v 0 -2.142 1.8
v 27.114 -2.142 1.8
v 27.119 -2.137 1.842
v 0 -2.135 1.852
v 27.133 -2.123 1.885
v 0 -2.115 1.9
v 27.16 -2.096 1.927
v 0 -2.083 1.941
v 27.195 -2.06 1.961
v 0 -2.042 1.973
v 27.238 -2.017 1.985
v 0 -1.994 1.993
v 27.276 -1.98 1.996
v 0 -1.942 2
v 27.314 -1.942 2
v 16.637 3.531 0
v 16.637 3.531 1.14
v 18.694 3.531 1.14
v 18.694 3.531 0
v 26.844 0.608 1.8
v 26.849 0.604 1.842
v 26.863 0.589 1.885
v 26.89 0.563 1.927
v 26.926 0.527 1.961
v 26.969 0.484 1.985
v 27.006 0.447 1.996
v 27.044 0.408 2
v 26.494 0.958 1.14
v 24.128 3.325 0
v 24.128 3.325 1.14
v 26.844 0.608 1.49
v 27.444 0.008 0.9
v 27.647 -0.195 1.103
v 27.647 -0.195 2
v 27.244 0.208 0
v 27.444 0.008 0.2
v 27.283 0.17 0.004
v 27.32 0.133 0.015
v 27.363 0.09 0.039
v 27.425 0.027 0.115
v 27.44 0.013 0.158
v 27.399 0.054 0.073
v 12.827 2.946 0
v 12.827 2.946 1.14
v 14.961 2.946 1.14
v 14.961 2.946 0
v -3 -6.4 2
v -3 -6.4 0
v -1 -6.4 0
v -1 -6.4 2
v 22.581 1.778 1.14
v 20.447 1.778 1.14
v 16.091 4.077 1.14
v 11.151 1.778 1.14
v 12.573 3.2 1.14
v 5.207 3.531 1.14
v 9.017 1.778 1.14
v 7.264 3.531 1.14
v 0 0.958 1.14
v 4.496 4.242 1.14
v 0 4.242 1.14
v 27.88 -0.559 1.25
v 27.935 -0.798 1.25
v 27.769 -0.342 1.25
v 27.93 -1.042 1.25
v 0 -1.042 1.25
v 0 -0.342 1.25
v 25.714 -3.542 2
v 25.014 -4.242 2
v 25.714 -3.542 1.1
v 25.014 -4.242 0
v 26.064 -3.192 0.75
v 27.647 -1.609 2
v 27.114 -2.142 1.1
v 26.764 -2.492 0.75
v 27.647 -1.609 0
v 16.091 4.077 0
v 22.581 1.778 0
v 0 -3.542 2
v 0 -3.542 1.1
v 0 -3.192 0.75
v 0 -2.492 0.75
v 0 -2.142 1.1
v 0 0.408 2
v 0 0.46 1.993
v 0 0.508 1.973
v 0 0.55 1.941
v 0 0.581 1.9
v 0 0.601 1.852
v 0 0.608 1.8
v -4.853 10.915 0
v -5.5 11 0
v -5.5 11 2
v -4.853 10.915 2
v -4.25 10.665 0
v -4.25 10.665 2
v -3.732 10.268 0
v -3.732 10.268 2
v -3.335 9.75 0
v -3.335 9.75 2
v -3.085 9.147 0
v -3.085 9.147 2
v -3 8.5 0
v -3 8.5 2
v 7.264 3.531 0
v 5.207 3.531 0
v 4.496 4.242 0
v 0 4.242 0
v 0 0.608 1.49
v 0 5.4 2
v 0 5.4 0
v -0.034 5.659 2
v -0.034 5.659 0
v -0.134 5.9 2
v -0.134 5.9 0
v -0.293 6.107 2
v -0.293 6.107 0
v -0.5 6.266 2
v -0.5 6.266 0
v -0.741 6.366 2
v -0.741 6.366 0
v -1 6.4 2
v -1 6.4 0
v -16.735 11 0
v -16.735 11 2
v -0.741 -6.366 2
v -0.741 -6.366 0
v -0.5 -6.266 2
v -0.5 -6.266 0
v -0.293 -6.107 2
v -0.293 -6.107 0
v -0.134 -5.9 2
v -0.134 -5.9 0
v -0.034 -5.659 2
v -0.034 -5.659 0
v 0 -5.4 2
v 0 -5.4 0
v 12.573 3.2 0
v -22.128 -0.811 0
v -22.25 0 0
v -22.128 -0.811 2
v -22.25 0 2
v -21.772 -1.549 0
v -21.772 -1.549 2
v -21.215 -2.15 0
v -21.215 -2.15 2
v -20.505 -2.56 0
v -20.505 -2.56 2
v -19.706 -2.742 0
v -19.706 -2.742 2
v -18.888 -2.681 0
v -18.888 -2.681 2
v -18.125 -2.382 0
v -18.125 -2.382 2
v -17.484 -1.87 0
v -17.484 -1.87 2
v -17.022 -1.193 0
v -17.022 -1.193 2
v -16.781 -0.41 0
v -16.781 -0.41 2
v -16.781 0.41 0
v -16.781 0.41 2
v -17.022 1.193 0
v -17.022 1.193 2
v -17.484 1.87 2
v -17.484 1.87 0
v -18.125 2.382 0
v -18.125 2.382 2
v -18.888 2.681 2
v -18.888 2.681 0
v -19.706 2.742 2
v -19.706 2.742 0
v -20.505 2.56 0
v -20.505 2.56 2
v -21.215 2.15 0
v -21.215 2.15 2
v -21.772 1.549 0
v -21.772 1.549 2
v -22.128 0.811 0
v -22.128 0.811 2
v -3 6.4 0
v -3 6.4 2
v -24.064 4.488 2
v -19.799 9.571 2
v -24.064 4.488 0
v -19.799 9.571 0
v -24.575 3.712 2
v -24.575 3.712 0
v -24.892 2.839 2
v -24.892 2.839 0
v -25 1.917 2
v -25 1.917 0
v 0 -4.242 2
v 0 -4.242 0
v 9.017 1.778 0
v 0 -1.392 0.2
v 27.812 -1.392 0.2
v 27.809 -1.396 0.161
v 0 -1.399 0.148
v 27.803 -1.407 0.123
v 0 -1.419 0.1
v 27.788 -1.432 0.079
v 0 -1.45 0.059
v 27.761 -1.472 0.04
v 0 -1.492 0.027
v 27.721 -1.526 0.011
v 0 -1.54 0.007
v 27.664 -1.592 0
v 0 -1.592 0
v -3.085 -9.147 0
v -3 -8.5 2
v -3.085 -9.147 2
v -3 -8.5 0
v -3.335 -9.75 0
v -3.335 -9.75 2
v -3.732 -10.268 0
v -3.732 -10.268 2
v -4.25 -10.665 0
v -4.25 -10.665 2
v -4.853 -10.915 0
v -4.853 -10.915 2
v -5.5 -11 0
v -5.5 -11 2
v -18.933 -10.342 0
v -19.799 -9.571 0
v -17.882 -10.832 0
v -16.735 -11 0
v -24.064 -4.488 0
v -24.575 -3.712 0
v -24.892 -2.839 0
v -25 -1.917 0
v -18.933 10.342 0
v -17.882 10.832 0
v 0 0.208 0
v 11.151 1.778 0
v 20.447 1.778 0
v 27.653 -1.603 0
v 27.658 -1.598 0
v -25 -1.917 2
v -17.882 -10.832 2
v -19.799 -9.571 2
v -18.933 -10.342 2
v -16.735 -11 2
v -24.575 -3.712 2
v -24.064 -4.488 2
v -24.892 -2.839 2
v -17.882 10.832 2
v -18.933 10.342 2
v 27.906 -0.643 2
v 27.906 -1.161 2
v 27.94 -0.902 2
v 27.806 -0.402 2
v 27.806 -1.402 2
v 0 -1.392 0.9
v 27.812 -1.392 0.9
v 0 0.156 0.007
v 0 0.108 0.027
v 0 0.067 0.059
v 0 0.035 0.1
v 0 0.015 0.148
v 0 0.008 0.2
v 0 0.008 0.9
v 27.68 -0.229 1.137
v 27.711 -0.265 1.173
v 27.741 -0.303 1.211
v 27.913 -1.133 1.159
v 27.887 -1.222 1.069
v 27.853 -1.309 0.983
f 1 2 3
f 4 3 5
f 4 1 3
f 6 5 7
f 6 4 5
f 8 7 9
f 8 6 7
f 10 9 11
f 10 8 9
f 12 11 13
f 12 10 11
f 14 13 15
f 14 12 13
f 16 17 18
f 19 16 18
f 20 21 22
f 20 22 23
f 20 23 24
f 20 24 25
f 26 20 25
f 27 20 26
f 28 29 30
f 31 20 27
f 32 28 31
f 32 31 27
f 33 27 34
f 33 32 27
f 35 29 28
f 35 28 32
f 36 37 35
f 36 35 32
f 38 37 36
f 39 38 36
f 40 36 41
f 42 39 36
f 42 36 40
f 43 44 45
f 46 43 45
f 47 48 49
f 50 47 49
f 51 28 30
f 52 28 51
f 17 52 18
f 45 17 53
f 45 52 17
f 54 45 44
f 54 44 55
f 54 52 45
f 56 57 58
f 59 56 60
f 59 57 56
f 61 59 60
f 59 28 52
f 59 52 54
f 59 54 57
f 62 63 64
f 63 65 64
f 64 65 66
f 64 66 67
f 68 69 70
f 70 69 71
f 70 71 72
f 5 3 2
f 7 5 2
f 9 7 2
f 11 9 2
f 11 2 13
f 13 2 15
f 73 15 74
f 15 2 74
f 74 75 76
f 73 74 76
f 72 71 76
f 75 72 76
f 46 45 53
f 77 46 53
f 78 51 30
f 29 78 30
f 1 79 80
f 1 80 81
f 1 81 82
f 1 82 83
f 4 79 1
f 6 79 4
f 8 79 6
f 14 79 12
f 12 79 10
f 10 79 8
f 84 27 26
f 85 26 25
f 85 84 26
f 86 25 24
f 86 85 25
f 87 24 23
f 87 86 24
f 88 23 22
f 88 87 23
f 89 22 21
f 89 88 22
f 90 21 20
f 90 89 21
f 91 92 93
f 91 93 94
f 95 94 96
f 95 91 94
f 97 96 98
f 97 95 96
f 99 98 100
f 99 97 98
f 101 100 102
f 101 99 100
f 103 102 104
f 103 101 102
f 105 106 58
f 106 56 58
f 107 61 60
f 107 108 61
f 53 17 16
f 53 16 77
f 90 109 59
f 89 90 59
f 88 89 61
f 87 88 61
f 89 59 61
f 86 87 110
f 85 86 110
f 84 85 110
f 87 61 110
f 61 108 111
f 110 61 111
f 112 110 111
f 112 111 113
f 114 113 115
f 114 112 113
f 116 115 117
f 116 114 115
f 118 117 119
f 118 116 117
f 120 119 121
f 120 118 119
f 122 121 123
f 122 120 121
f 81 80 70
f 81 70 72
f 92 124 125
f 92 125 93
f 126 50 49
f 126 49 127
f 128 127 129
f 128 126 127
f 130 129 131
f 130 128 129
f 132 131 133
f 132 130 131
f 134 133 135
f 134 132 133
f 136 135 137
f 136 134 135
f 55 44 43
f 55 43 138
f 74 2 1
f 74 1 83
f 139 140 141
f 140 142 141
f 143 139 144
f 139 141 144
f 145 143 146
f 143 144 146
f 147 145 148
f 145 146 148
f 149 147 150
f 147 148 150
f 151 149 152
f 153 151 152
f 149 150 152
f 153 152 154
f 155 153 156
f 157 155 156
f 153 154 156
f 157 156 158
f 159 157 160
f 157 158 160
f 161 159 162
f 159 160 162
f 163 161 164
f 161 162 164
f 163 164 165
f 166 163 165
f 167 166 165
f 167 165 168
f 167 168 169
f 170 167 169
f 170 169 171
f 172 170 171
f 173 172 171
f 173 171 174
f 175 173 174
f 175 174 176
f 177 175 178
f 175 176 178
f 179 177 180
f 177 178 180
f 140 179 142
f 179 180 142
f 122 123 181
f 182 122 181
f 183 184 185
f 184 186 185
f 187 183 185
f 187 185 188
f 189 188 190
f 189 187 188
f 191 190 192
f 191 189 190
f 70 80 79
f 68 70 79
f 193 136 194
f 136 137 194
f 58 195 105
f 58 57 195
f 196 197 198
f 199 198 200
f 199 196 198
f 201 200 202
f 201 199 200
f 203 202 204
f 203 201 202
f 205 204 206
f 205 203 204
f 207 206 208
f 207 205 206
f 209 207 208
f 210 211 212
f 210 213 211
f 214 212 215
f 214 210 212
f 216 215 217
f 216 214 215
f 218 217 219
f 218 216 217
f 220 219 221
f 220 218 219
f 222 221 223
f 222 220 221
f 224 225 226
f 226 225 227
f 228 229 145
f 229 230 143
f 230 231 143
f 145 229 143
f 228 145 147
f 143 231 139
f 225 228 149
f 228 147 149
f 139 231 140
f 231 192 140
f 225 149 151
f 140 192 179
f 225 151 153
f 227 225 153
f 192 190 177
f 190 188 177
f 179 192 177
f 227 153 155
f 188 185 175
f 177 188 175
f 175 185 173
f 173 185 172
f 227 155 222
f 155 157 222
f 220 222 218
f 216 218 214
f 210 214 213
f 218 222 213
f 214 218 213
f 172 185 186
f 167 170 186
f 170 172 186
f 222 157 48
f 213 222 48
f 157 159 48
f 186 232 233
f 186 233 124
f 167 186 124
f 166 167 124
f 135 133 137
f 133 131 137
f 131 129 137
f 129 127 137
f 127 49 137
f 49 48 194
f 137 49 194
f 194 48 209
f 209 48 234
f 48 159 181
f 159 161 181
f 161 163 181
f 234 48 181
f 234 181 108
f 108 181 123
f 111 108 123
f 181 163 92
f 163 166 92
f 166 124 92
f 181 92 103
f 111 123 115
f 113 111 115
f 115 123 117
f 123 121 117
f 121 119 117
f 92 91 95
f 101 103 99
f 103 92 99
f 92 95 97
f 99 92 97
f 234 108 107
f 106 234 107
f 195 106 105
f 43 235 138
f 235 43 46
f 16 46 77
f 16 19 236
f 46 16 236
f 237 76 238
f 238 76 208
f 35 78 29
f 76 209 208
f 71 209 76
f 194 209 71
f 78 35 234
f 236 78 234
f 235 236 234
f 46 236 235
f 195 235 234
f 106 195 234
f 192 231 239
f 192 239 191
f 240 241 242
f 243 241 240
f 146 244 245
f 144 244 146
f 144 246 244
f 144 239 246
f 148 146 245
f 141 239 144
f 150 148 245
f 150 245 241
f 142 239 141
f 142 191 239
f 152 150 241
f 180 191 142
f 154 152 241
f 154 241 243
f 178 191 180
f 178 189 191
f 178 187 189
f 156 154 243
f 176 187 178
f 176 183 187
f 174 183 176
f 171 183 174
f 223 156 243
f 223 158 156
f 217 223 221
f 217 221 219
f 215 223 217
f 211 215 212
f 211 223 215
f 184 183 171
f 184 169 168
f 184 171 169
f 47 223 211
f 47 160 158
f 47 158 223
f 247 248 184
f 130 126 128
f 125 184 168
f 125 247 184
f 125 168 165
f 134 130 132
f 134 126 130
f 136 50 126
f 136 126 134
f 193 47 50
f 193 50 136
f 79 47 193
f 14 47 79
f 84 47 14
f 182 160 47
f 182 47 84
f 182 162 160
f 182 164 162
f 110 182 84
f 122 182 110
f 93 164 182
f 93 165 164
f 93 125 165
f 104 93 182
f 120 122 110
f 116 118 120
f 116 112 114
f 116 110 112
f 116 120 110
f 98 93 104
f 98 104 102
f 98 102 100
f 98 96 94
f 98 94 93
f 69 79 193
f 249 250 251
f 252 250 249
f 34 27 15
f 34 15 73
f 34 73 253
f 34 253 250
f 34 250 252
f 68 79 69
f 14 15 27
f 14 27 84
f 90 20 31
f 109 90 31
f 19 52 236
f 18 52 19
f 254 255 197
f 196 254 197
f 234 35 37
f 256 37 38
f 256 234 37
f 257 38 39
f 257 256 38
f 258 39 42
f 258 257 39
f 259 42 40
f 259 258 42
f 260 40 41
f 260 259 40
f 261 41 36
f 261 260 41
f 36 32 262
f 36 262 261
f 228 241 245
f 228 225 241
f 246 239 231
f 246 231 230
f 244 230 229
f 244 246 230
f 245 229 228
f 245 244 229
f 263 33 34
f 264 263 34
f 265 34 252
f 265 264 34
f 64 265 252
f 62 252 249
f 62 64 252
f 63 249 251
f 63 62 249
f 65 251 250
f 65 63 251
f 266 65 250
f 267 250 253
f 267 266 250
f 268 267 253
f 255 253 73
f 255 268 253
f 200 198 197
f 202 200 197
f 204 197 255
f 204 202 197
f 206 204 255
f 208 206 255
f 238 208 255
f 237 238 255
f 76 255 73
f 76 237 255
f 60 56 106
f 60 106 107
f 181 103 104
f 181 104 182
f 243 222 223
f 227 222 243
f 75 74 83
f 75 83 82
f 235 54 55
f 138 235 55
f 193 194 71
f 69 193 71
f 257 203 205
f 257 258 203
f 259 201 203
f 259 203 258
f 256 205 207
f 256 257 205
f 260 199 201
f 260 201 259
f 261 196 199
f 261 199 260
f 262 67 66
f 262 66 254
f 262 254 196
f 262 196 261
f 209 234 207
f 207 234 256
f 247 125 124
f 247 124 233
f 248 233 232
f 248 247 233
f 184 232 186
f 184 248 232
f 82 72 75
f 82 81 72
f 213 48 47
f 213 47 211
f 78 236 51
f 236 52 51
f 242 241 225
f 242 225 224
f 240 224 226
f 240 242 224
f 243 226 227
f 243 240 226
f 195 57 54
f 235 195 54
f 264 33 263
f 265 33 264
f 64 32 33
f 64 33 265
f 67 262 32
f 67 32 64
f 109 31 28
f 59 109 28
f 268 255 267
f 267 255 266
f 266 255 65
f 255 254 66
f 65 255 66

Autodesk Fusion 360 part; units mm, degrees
sketch "Sketch1" plane through (0, 0, 0) normal (0, 0, 1) x (1, 0, 0)
  line L0 (0, 0) -> (27.94, 0) construction
  line L1 (0, -4.2418) -> (27.94, -4.2418)
  line L2 (0, 4.2418) -> (27.94, 4.2418)
  line L3 (-3, -6.4) -> (0, -6.4)
  line L4 (0, 6.4) -> (-3, 6.4)
  line L5 (-18.6, 11) -> (-3, 11)
  line L6 (-3, -11) -> (-18.6, -11)
  line L7 (-25, -3.3728) -> (-25, 3.3728)
  line L8 (-18.6, 11) -> (-25, 3.3728)
  line L9 (-25, 11) -> (-33.2141, 11) construction
  line L10 (-18.6, -11) -> (-25, -3.3728)
  line L11 (-18.6, -11) -> (-34.3032, -11) construction
  line L12 (-3, 11) -> (-3, 6.4)
  line L13 (-3, -6.4) -> (-3, -11)
  arc A0 (-3, 8.5) -> (-5.5, 11) centre (-5.5, 8.5) ccw
  arc A1 (-5.5, -11) -> (-3, -8.5) centre (-5.5, -8.5) ccw
  line L14 (27.94, 4.2418) -> (27.94, -4.2418)
  line L15 (23.2107, 4.2418) -> (27.6471, -0.1946)
  line L16 (23.2107, 4.2418) -> (33.0981, 4.2418) construction
  line L17 (0, -0.9017) -> (27.94, -0.9017) construction
  line L18 (25.0141, -4.2418) -> (27.6471, -1.6088)
  line L19 (25.0141, -4.2418) -> (38.1109, -4.2418) construction
  arc A2 (27.6471, -1.6088) -> (27.3724, 0) centre (26.94, -0.9017) ccw
  line L20 (0, 4.2418) -> (0, 6.4)
  line L21 (0, -6.4) -> (0, -4.2418)
  dimension "d6" = 27.94
  dimension "d7" = 4.2418
  dimension "d8" = -4.2418
  dimension "d10" = 6.4
  dimension "d11" = 6.4
  dimension "d13" = 3
  dimension "d14" = 11
  dimension "d15" = 11
  dimension "d17" = 50
  dimension "d19" = 50
  dimension "d21" = 6.4
  dimension "d23" = 5
  dimension "d24" = 5
  dimension "d25" = 22
  dimension "d26" = 7.6272
  dimension "d27" = 7.6272
  dimension "d29" = 45
  dimension "d30" = 3.3401
  dimension "d31" = 2
  dimension "d32" = 45
extrude "Extrude1" add sketch "Sketch1" along normal blind 2 contours L1 L2 L3 L4 L5 L6 L7 L8 L10 L12 L13 A0 A1 L15 L18 A2 L20 L21
fillet "Fillet1" radius 1 2 edges at (0, -6.4, 1) (0, 6.4, 1)
fillet "Fillet1" radius 4 4 edges at (-18.6, -11, 1) (-25, -3.3728, 1) (-25, 3.3728, 1) (-18.6, 11, 1)
sketch "Sketch2" plane through (0, 0, 2) normal (0, 0, 1) x (-1, 0, 0)
  line L0 (3, 6.4) -> (1, 6.4)
  line L1 (0, 5.4) -> (0, 4.2418)
  line L2 (0, 4.2418) -> (-25.0141, 4.2418)
  line L3 (-25.0141, 4.2418) -> (-27.6471, 1.6088)
  arc A0 (-27.6471, 1.6088) -> (-27.6471, 0.1946) centre (-26.94, 0.9017) ccw
  line L4 (-27.6471, 0.1946) -> (-23.2107, -4.2418)
  line L5 (-23.2107, -4.2418) -> (0, -4.2418)
  line L6 (0, -4.2418) -> (0, -5.4)
  line L7 (1, -6.4) -> (3, -6.4)
  line L8 (3, -6.4) -> (3, -8.5)
  arc A1 (3, -8.5) -> (5.5, -11) centre (5.5, -8.5) ccw
  line L9 (5.5, -11) -> (16.7348, -11)
  line L10 (19.7989, -9.5712) -> (24.0642, -4.488)
  line L11 (25, -1.9169) -> (25, 1.9169)
  line L12 (24.0642, 4.488) -> (19.7989, 9.5712)
  line L13 (16.7348, 11) -> (5.5, 11)
  arc A2 (5.5, 11) -> (3, 8.5) centre (5.5, 8.5) ccw
  line L14 (3, 8.5) -> (3, 6.4)
  line L15 (0, 4.2418) -> (0, -4.2418) construction
  line L16 (-6.2738, -4.2418) -> (-6.2738, 4.2418) construction
  line L17 (-10.0838, -4.2418) -> (-10.0838, 4.2418) construction
  line L18 (-13.8938, -4.2418) -> (-13.8938, 4.2418) construction
  line L19 (-17.7038, -4.2418) -> (-17.7038, 4.2418) construction
  line L20 (-21.5138, -4.2418) -> (-21.5138, 4.2418) construction
  line L21 (-5.207, -4.2418) -> (-5.207, 4.2418) construction
  line L22 (-7.3406, -4.2418) -> (-7.3406, 4.2418) construction
  line L23 (-9.017, -4.2418) -> (-9.017, 4.2418) construction
  line L24 (-11.1506, -4.2418) -> (-11.1506, 4.2418) construction
  line L25 (-12.827, -4.2418) -> (-12.827, 4.2418) construction
  line L26 (-14.9606, -4.2418) -> (-14.9606, 4.2418) construction
  line L27 (-16.637, -4.2418) -> (-16.637, 4.2418) construction
  line L28 (-18.7706, -4.2418) -> (-18.7706, 4.2418) construction
  line L29 (-20.447, -4.2418) -> (-20.447, 4.2418) construction
  line L30 (-22.5806, -4.2418) -> (-22.5806, 4.2418) construction
  line L31 (-5.207, -3.5306) -> (-7.3406, -3.5306)
  line L32 (-9.017, -1.778) -> (-11.1506, -1.778)
  line L33 (-12.827, -2.9464) -> (-14.9606, -2.9464)
  line L34 (-16.637, -3.5306) -> (-18.7706, -3.5306)
  line L35 (-20.447, -1.778) -> (-22.5806, -1.778)
  line L36 (-5.207, -3.5306) -> (-0.9644, -7.7732)
  line L37 (-5.207, -3.5306) -> (0.793, -3.5306) construction
  line L38 (-7.3406, -3.5306) -> (-11.5832, -7.7732)
  line L39 (-7.3406, -3.5306) -> (-13.3406, -3.5306) construction
  line L40 (-9.017, -1.778) -> (-4.7744, -6.0206)
  line L41 (-9.017, -1.778) -> (-3.017, -1.778) construction
  line L42 (-11.1506, -1.778) -> (-15.3932, -6.0206)
  line L43 (-11.1506, -1.778) -> (-17.1506, -1.778) construction
  line L44 (-12.827, -2.9464) -> (-8.5844, -7.189)
  line L45 (-12.827, -2.9464) -> (-6.827, -2.9464) construction
  line L46 (-14.9606, -2.9464) -> (-19.2032, -7.189)
  line L47 (-14.9606, -2.9464) -> (-20.9606, -2.9464) construction
  line L48 (-16.637, -3.5306) -> (-12.3944, -7.7732)
  line L49 (-16.637, -3.5306) -> (-10.637, -3.5306) construction
  line L50 (-18.7706, -3.5306) -> (-23.0132, -7.7732)
  line L51 (-18.7706, -3.5306) -> (-24.7706, -3.5306) construction
  line L52 (-20.447, -1.778) -> (-16.2044, -6.0206)
  line L53 (-20.447, -1.778) -> (-14.447, -1.778) construction
  line L54 (-22.5806, -1.778) -> (-26.8232, -6.0206)
  line L55 (-22.5806, -1.778) -> (-28.5806, -1.778) construction
  line L56 (0, 0) -> (25, 0) construction
  circle A3 centre (19.5, 0) radius 2.75
  arc A4 (0, -5.4) -> (1, -6.4) centre (1, -5.4) ccw
  arc A5 (1, 6.4) -> (0, 5.4) centre (1, 5.4) ccw
  arc A6 (16.7348, -11) -> (19.7989, -9.5712) centre (16.7348, -7) ccw
  arc A7 (24.0642, -4.488) -> (25, -1.9169) centre (21, -1.9169) ccw
  arc A8 (25, 1.9169) -> (24.0642, 4.488) centre (21, 1.9169) ccw
  arc A9 (19.7989, 9.5712) -> (16.7348, 11) centre (16.7348, 7) ccw
  dimension "d35" = 6.2738
  dimension "d36" = 10.0838
  dimension "d37" = 13.8938
  dimension "d38" = 17.7038
  dimension "d39" = 21.5138
  dimension "d40" = 1.0668
  dimension "d41" = -1.0668
  dimension "d42" = 1.0668
  dimension "d43" = -1.0668
  dimension "d44" = 1.0668
  dimension "d45" = -1.0668
  dimension "d46" = 1.0668
  dimension "d47" = -1.0668
  dimension "d48" = 1.0668
  dimension "d49" = -1.0668
  dimension "d51" = 6.0198
  dimension "d53" = 7.1882
  dimension "d54" = 7.7724
  dimension "d55" = 6.0198
  dimension "d56" = 45
  dimension "d57" = 6
  dimension "d58" = 45
  dimension "d59" = 6
  dimension "d60" = 45
  dimension "d61" = 6
  dimension "d62" = 45
  dimension "d63" = 6
  dimension "d64" = 45
  dimension "d65" = 6
  dimension "d66" = 45
  dimension "d67" = 6
  dimension "d68" = 45
  dimension "d69" = 6
  dimension "d70" = 45
  dimension "d71" = 6
  dimension "d72" = 45
  dimension "d73" = 6
  dimension "d74" = 45
  dimension "d75" = 6
  dimension "d76" = 5.5
  dimension "d77" = 5.5
  dimension "d123" = 7.7724
extrude "Extrude2" cut sketch "Sketch2" against normal blind 2 contours L0 L1 L2 L3 A0 L4 L5 L6 L7 L8 A1 L9 L10 L11 L12 L13 A2 L14 L31 L32 L33 L34 L35 L36 L40 L42 L44 L46 L48 L52 L54 A4 A5 A6 A7 A8 A9 keep common part
sketch "Sketch3" plane through (0, 0, 0) normal (1, 0, 0) x (0, 1, 0)
  line L0 (4.2418, 0) -> (4.2418, 2)
  line L1 (-4.2418, 0) -> (-4.2418, 2)
  line L2 (-4.2418, 2) -> (4.2418, 2)
  line L3 (-4.2418, 0) -> (4.2418, 0)
  line L4 (-3.5418, 0.75) -> (-3.5418, 2)
  line L5 (-2.1418, 2) -> (-2.1418, 0.75)
  line L6 (0.6082, 2) -> (0.6082, 1.49)
  line L7 (-1.3918, 1.25) -> (-1.3918, 0)
  line L8 (0.0082, 1.25) -> (0.0082, 0)
  line L9 (-3.5418, 0.75) -> (-2.1418, 0.75)
  line L10 (-1.3918, 1.25) -> (0.0082, 1.25)
  line L11 (0.9582, 1.14) -> (4.2418, 1.14)
  line L12 (0.6082, 1.49) -> (0.9582, 1.14)
  line L13 (0.6082, 1.49) -> (1.6082, 1.49) construction
  line L14 (-1.3918, 0.9) -> (-1.0418, 1.25)
  line L15 (-1.3918, 0.9) -> (-0.3918, 0.9) construction
  line L16 (0.0082, 0.9) -> (-0.3418, 1.25)
  line L17 (0.0082, 0.9) -> (-0.9918, 0.9) construction
  line L18 (-3.5418, 1.1) -> (-2.5418, 1.1) construction
  line L19 (-2.1418, 1.1) -> (-3.1418, 1.1) construction
  line L20 (-3.5418, 1.1) -> (-3.1918, 0.75)
  line L21 (-2.8418, 0.4) -> (-2.8347, 0.3929) construction
  line L22 (-2.1418, 1.1) -> (-2.4918, 0.75)
  line L23 (-2.8418, 0.4) -> (-2.8489, 0.3929) construction
  arc A0 (-1.9418, 2) -> (-2.1418, 1.8) centre (-1.9418, 1.8) ccw
  arc A1 (0.6082, 1.8) -> (0.4082, 2) centre (0.4082, 1.8) ccw
  arc A2 (0.0082, 0.2) -> (0.2082, 0) centre (0.2082, 0.2) ccw
  arc A3 (-1.5918, 0) -> (-1.3918, 0.2) centre (-1.5918, 0.2) ccw
  point P0 (-4.2418, 0)
  point P1 (-4.2418, 2)
  dimension "d84" = 0.7
  dimension "d85" = 1.4
  dimension "d86" = 2.75
  dimension "d87" = 2.85
  dimension "d88" = 1.4
  dimension "d90" = 0.75
  dimension "d92" = 1.25
  dimension "d93" = 0.86
  dimension "d96" = 45
  dimension "d99" = 45
  dimension "d101" = 45
  dimension "d103" = 0.35
  dimension "d104" = 0.35
  dimension "d105" = 45
  dimension "d106" = 1
  dimension "d107" = 45
  dimension "d108" = 1
  dimension "d109" = 0.35
  dimension "d110" = 0.35
  dimension "d111" = 0.35
  dimension "d112" = 0.4
  dimension "d113" = 0.4
  dimension "d114" = 0.4
  dimension "d115" = 0.4
extrude "Extrude3" cut sketch "Sketch3" along normal blind 30 contours L0 L2 L6 L11 L12 | L3 L8 A2 | L3 L7 L8 L10 L14 L16 | L2 L6 A1 | L3 L7 A3 | L2 L5 A0 | L2 L4 L5 L9 L20 L22
sketch "Sketch4" plane through (0, 0, 0) normal (0, 0, 1) x (1, 0, 0)
  line L0 (6.2738, 0) -> (6.2738, 35)
  line L1 (10.0838, 0) -> (10.0838, 30)
  line L2 (13.8938, 0) -> (13.8938, 25)
  line L3 (17.7038, 0) -> (17.7038, 20)
  line L4 (21.5138, 0) -> (21.5138, 15)
  line L5 (6.2738, 35) -> (16.2738, 35) construction
  line L6 (16.2738, 35) -> (16.2738, 39) construction
  line L7 (16.2738, 39) -> (6.2738, 39) construction
  line L8 (6.2738, 39) -> (6.2738, 35) construction
  line L9 (10.0838, 30) -> (20.0838, 30) construction
  line L10 (20.0838, 30) -> (20.0838, 34) construction
  line L11 (20.0838, 34) -> (10.0838, 34) construction
  line L12 (10.0838, 34) -> (10.0838, 30) construction
  line L13 (13.8938, 25) -> (23.8938, 25) construction
  line L14 (23.8938, 25) -> (23.8938, 29) construction
  line L15 (23.8938, 29) -> (13.8938, 29) construction
  line L16 (13.8938, 29) -> (13.8938, 25) construction
  line L17 (17.7038, 20) -> (27.7038, 20) construction
  line L18 (27.7038, 20) -> (27.7038, 24) construction
  line L19 (27.7038, 24) -> (17.7038, 24) construction
  line L20 (17.7038, 24) -> (17.7038, 20) construction
  line L21 (21.5138, 15) -> (31.5138, 15) construction
  line L22 (31.5138, 15) -> (31.5138, 19) construction
  line L23 (31.5138, 19) -> (21.5138, 19) construction
  line L24 (21.5138, 19) -> (21.5138, 15) construction
  line L25 (40.8004, 0.0886) -> (100.8004, 0.0886) construction
  line L26 (100.8004, 0.0886) -> (100.8004, 75.0886) construction
  line L27 (100.8004, 75.0886) -> (40.8004, 75.0886) construction
  line L28 (40.8004, 75.0886) -> (40.8004, 0.0886) construction
  line L29 (100.8004, 69.0886) -> (40.8004, 69.0886) construction
  line L30 (40.8004, 69.0886) -> (100.8004, 69.0886) construction
  line L31 (100.8004, 69.0886) -> (100.8004, 75.0886) construction
  line L32 (100.8004, 75.0886) -> (40.8004, 75.0886) construction
  line L33 (40.8004, 75.0886) -> (40.8004, 69.0886) construction
  line L34 (100.8004, 63.0886) -> (40.8004, 63.0886) construction
  line L35 (40.8004, 63.0886) -> (100.8004, 63.0886) construction
  line L36 (100.8004, 63.0886) -> (100.8004, 69.0886) construction
  line L37 (100.8004, 69.0886) -> (40.8004, 69.0886) construction
  line L38 (40.8004, 69.0886) -> (40.8004, 63.0886) construction
  line L39 (40.8004, 0.1102) -> (100.8004, 0.1102) construction
  line L40 (100.8004, 0.1102) -> (100.8004, 63.0886) construction
  line L41 (100.8004, 63.0886) -> (40.8004, 63.0886) construction
  line L42 (40.8004, 63.0886) -> (40.8004, 0.1102) construction
  line L43 (113.1762, 75.0886) -> (179.487, 75.0886) construction
  line L44 (179.487, 75.0886) -> (179.487, 0.0886) construction
  line L45 (179.487, 0.0886) -> (113.1762, 0.0886) construction
  line L46 (113.1762, 0.0886) -> (113.1762, 75.0886) construction
  line L47 (113.1762, 69.0886) -> (179.487, 69.0886) construction
  line L48 (113.1762, 63.0886) -> (179.487, 63.0886) construction
  line L49 (113.1762, 69.0886) -> (179.487, 69.0886) construction
  line L50 (179.487, 69.0886) -> (179.487, 75.0886) construction
  line L51 (179.487, 75.0886) -> (113.1762, 75.0886) construction
  line L52 (113.1762, 75.0886) -> (113.1762, 69.0886) construction
  line L53 (113.1762, 63.0886) -> (179.487, 63.0886) construction
  line L54 (179.487, 63.0886) -> (179.487, 69.0886) construction
  line L55 (179.487, 69.0886) -> (113.1762, 69.0886) construction
  line L56 (113.1762, 69.0886) -> (113.1762, 63.0886) construction
  line L57 (113.1762, 38.0886) -> (179.487, 38.0886) construction
  line L58 (113.1762, 38.0886) -> (179.487, 38.0886) construction
  line L59 (179.487, 38.0886) -> (179.487, 63.0886) construction
  line L60 (179.487, 63.0886) -> (113.1762, 63.0886) construction
  line L61 (113.1762, 63.0886) -> (113.1762, 38.0886) construction
  line L62 (179.487, 4.8386) -> (113.1762, 4.8386) construction
  line L63 (179.487, 9.5886) -> (113.1762, 9.5886) construction
  line L64 (179.487, 14.3386) -> (113.1762, 14.3386) construction
  line L65 (179.487, 19.0886) -> (113.1762, 19.0886) construction
  line L66 (179.487, 23.8386) -> (113.1762, 23.8386) construction
  line L67 (179.487, 28.5886) -> (113.1762, 28.5886) construction
  line L68 (179.487, 33.3386) -> (113.1762, 33.3386) construction
  line L69 (113.1762, 38.0886) -> (179.487, 38.0886)
  line L70 (179.487, 38.0886) -> (179.487, 0.0886)
  line L71 (179.487, 0.0886) -> (113.1762, 0.0886)
  line L72 (113.1762, 0.0886) -> (113.1762, 38.0886)
  line L73 (113.1762, 4.8386) -> (179.487, 4.8386)
  line L74 (179.487, 9.5886) -> (113.1762, 9.5886)
  line L75 (113.1762, 14.3386) -> (179.487, 14.3386)
  line L76 (113.1762, 19.0886) -> (179.487, 19.0886)
  line L77 (113.1762, 23.8386) -> (179.487, 23.8386)
  line L78 (113.1762, 28.5886) -> (179.487, 28.5886)
  line L79 (113.1762, 33.3386) -> (179.487, 33.3386)
  line L80 (130.6528, 38.0886) -> (130.6528, 0.0886)
  line L81 (155.9913, 38.0886) -> (155.9913, 0.0886)
  line L82 (113.1762, 33.3386) -> (130.6528, 33.3386) construction
  line L83 (130.6528, 33.3386) -> (130.6528, 38.0886) construction
  line L84 (130.6528, 38.0886) -> (113.1762, 38.0886) construction
  line L85 (113.1762, 38.0886) -> (113.1762, 33.3386) construction
  line L86 (130.6528, 33.3386) -> (155.9913, 33.3386) construction
  line L87 (155.9913, 33.3386) -> (155.9913, 38.0886) construction
  line L88 (155.9913, 38.0886) -> (130.6528, 38.0886) construction
  line L89 (130.6528, 38.0886) -> (130.6528, 33.3386) construction
  line L90 (155.9913, 33.3386) -> (179.487, 33.3386) construction
  line L91 (179.487, 33.3386) -> (179.487, 38.0886) construction
  line L92 (179.487, 38.0886) -> (155.9913, 38.0886) construction
  line L93 (155.9913, 38.0886) -> (155.9913, 33.3386) construction
  line L94 (113.1762, 28.5886) -> (130.6528, 28.5886) construction
  line L95 (130.6528, 28.5886) -> (130.6528, 33.3386) construction
  line L96 (130.6528, 33.3386) -> (113.1762, 33.3386) construction
  line L97 (113.1762, 33.3386) -> (113.1762, 28.5886) construction
  line L98 (113.1762, 23.8386) -> (130.6528, 23.8386) construction
  line L99 (130.6528, 23.8386) -> (130.6528, 28.5886) construction
  line L100 (130.6528, 28.5886) -> (113.1762, 28.5886) construction
  line L101 (113.1762, 28.5886) -> (113.1762, 23.8386) construction
  line L102 (113.1762, 19.0886) -> (130.6528, 19.0886) construction
  line L103 (130.6528, 19.0886) -> (130.6528, 23.8386) construction
  line L104 (130.6528, 23.8386) -> (113.1762, 23.8386) construction
  line L105 (113.1762, 23.8386) -> (113.1762, 19.0886) construction
  line L106 (113.1762, 14.3386) -> (130.6528, 14.3386) construction
  line L107 (130.6528, 14.3386) -> (130.6528, 19.0886) construction
  line L108 (130.6528, 19.0886) -> (113.1762, 19.0886) construction
  line L109 (113.1762, 19.0886) -> (113.1762, 14.3386) construction
  line L110 (113.1762, 9.5886) -> (130.6528, 9.5886) construction
  line L111 (130.6528, 9.5886) -> (130.6528, 14.3386) construction
  line L112 (130.6528, 14.3386) -> (113.1762, 14.3386) construction
  line L113 (113.1762, 14.3386) -> (113.1762, 9.5886) construction
  line L114 (113.1762, 4.8386) -> (130.6528, 4.8386) construction
  line L115 (130.6528, 4.8386) -> (130.6528, 9.5886) construction
  line L116 (130.6528, 9.5886) -> (113.1762, 9.5886) construction
  line L117 (113.1762, 9.5886) -> (113.1762, 4.8386) construction
  line L118 (113.1762, 0.0886) -> (130.6528, 0.0886) construction
  line L119 (130.6528, 0.0886) -> (130.6528, 4.8386) construction
  line L120 (130.6528, 4.8386) -> (113.1762, 4.8386) construction
  line L121 (113.1762, 4.8386) -> (113.1762, 0.0886) construction
  line L122 (155.9913, 28.5886) -> (179.487, 28.5886) construction
  line L123 (179.487, 28.5886) -> (179.487, 33.3386) construction
  line L124 (179.487, 33.3386) -> (155.9913, 33.3386) construction
  line L125 (155.9913, 33.3386) -> (155.9913, 28.5886) construction
  line L126 (155.9913, 23.8386) -> (179.487, 23.8386) construction
  line L127 (179.487, 23.8386) -> (179.487, 28.5886) construction
  line L128 (179.487, 28.5886) -> (155.9913, 28.5886) construction
  line L129 (155.9913, 28.5886) -> (155.9913, 23.8386) construction
  line L130 (155.9913, 19.0886) -> (179.487, 19.0886) construction
  line L131 (179.487, 19.0886) -> (179.487, 23.8386) construction
  line L132 (179.487, 23.8386) -> (155.9913, 23.8386) construction
  line L133 (155.9913, 23.8386) -> (155.9913, 19.0886) construction
  line L134 (155.9913, 14.3386) -> (179.487, 14.3386) construction
  line L135 (179.487, 14.3386) -> (179.487, 19.0886) construction
  line L136 (179.487, 19.0886) -> (155.9913, 19.0886) construction
  line L137 (155.9913, 19.0886) -> (155.9913, 14.3386) construction
  line L138 (155.9913, 9.5886) -> (179.487, 9.5886) construction
  line L139 (179.487, 9.5886) -> (179.487, 14.3386) construction
  line L140 (179.487, 14.3386) -> (155.9913, 14.3386) construction
  line L141 (155.9913, 14.3386) -> (155.9913, 9.5886) construction
  line L142 (155.9913, 4.8386) -> (179.487, 4.8386) construction
  line L143 (179.487, 4.8386) -> (179.487, 9.5886) construction
  line L144 (179.487, 9.5886) -> (155.9913, 9.5886) construction
  line L145 (155.9913, 9.5886) -> (155.9913, 4.8386) construction
  line L146 (155.9913, 0.0886) -> (179.487, 0.0886) construction
  line L147 (179.487, 0.0886) -> (179.487, 4.8386) construction
  line L148 (179.487, 4.8386) -> (155.9913, 4.8386) construction
  line L149 (155.9913, 4.8386) -> (155.9913, 0.0886) construction
  line L150 (130.6528, 28.5886) -> (155.9913, 28.5886) construction
  line L151 (155.9913, 28.5886) -> (155.9913, 33.3386) construction
  line L152 (155.9913, 33.3386) -> (130.6528, 33.3386) construction
  line L153 (130.6528, 33.3386) -> (130.6528, 28.5886) construction
  line L154 (130.6528, 23.8386) -> (155.9913, 23.8386) construction
  line L155 (155.9913, 23.8386) -> (155.9913, 28.5886) construction
  line L156 (155.9913, 28.5886) -> (130.6528, 28.5886) construction
  line L157 (130.6528, 28.5886) -> (130.6528, 23.8386) construction
  line L158 (130.6528, 19.0886) -> (155.9913, 19.0886) construction
  line L159 (155.9913, 19.0886) -> (155.9913, 23.8386) construction
  line L160 (155.9913, 23.8386) -> (130.6528, 23.8386) construction
  line L161 (130.6528, 23.8386) -> (130.6528, 19.0886) construction
  line L162 (130.6528, 14.3386) -> (155.9913, 14.3386) construction
  line L163 (155.9913, 14.3386) -> (155.9913, 19.0886) construction
  line L164 (155.9913, 19.0886) -> (130.6528, 19.0886) construction
  line L165 (130.6528, 19.0886) -> (130.6528, 14.3386) construction
  line L166 (130.6528, 9.5886) -> (155.9913, 9.5886) construction
  line L167 (155.9913, 9.5886) -> (155.9913, 14.3386) construction
  line L168 (155.9913, 14.3386) -> (130.6528, 14.3386) construction
  line L169 (130.6528, 14.3386) -> (130.6528, 9.5886) construction
  line L170 (130.6528, 4.8386) -> (155.9913, 4.8386) construction
  line L171 (155.9913, 4.8386) -> (155.9913, 9.5886) construction
  line L172 (155.9913, 9.5886) -> (130.6528, 9.5886) construction
  line L173 (130.6528, 9.5886) -> (130.6528, 4.8386) construction
  line L174 (130.6528, 0.0886) -> (155.9913, 0.0886) construction
  line L175 (155.9913, 0.0886) -> (155.9913, 4.8386) construction
  line L176 (155.9913, 4.8386) -> (130.6528, 4.8386) construction
  line L177 (130.6528, 4.8386) -> (130.6528, 0.0886) construction
  dimension "d125" = 35
  dimension "d126" = 30
  dimension "d127" = 25
  dimension "d128" = 20
  dimension "d129" = 15
  dimension "d140" = 3
  dimension "d141" = 3
  dimension "d142" = 3
  dimension "d143" = 3
  dimension "d144" = 3
  dimension "d145" = 60
  dimension "d146" = 75
  dimension "d147" = -6
  dimension "d148" = 4
  dimension "d149" = -12
  dimension "d150" = 4
  dimension "d151" = 3
  dimension "d152" = 6
  dimension "d153" = 12
  dimension "d154" = 4
  dimension "d155" = 4
  dimension "d156" = 25
  dimension "d157" = 3
  dimension "d158" = 75
  dimension "d159" = 75
  dimension "d163" = 0
  dimension "d164" = 4.75
  dimension "d165" = 3
  dimension "d166" = 3
  dimension "d167" = 3
  dimension "d168" = 3
  dimension "d169" = 3
  dimension "d170" = 3
  dimension "d171" = 3
  dimension "d172" = 3
  dimension "d173" = 3
  dimension "d174" = 3
  dimension "d175" = 3
  dimension "d176" = 3
  dimension "d177" = 3
  dimension "d178" = 3
  dimension "d179" = 3
  dimension "d180" = 3
  dimension "d181" = 3
  dimension "d182" = 3
  dimension "d183" = 3
  dimension "d184" = 3
  dimension "d185" = 3
  dimension "d186" = 3
  dimension "d187" = 3
  dimension "d188" = 3
equation "d6 = ( 1.1 * 25.4 ) * 1 mm"
equation "d7 = ( 0.334 * 12.7 ) * 1 mm"
equation "d8 = ( 0.334 * -12.7 ) * 1 mm"
equation "d30 = ( ( 0.334 - 0.2025 ) * 25.4 ) * 1 mm"
equation "d35 = ( 0.247 * 25.4 ) * 1 mm"
equation "d36 = ( 0.397 * 25.4 ) * 1 mm"
equation "d37 = ( 0.547 * 25.4 ) * 1 mm"
equation "d38 = ( 0.697 * 25.4 ) * 1 mm"
equation "d39 = ( 0.847 * 25.4 ) * 1 mm"
equation "d40 = ( 0.042 * 25.4 ) * 1 mm"
equation "d41 = ( 0.042 * -25.4 ) * 1 mm"
equation "d42 = ( 0.042 * 25.4 ) * 1 mm"
equation "d43 = ( 0.042 * -25.4 ) * 1 mm"
equation "d44 = ( 0.042 * 25.4 ) * 1 mm"
equation "d45 = ( 0.042 * -25.4 ) * 1 mm"
equation "d46 = ( 0.042 * 25.4 ) * 1 mm"
equation "d47 = ( 0.042 * -25.4 ) * 1 mm"
equation "d48 = ( 0.042 * 25.4 ) * 1 mm"
equation "d49 = ( 0.042 * -25.4 ) * 1 mm"
equation "d51 = ( ( 0.168 + ( 0.023 * ( 8 - CUT_2 ) ) ) * 25.4 ) * 1 mm"
equation "d53 = ( ( 0.168 + ( 0.023 * ( 8 - CUT_3 ) ) ) * 25.4 ) * 1 mm"
equation "d54 = ( ( 0.168 + ( 0.023 * ( 8 - CUT_4 ) ) ) * 25.4 ) * 1 mm"
equation "d55 = ( ( 0.168 + ( 0.023 * ( 8 - CUT_5 ) ) ) * 25.4 ) * 1 mm"
equation "CUT_1 = floor(KEYCODE / 10000)" comment "DON'T CHANGE THIS"
equation "CUT_2 = floor(( KEYCODE - ( floor(KEYCODE / 10000) * 10000 ) ) / 1000)" comment "DON'T CHANGE THIS"
equation "CUT_3 = floor(( KEYCODE - ( floor(KEYCODE / 1000) * 1000 ) ) / 100)" comment "DON'T CHANGE THIS"
equation "CUT_4 = floor(( KEYCODE - ( floor(KEYCODE / 100) * 100 ) ) / 10)" comment "DON'T CHANGE THIS"
equation "CUT_5 = floor(( KEYCODE - ( floor(KEYCODE / 10) * 10 ) ) / 1)" comment "DON'T CHANGE THIS"
equation "d123 = ( ( 0.168 + ( 0.023 * ( 8 - CUT_1 ) ) ) * 25.4 ) * 1 mm"
equation "KEYCODE = 25325" comment "ENTER THE KEYCODE HERE"
